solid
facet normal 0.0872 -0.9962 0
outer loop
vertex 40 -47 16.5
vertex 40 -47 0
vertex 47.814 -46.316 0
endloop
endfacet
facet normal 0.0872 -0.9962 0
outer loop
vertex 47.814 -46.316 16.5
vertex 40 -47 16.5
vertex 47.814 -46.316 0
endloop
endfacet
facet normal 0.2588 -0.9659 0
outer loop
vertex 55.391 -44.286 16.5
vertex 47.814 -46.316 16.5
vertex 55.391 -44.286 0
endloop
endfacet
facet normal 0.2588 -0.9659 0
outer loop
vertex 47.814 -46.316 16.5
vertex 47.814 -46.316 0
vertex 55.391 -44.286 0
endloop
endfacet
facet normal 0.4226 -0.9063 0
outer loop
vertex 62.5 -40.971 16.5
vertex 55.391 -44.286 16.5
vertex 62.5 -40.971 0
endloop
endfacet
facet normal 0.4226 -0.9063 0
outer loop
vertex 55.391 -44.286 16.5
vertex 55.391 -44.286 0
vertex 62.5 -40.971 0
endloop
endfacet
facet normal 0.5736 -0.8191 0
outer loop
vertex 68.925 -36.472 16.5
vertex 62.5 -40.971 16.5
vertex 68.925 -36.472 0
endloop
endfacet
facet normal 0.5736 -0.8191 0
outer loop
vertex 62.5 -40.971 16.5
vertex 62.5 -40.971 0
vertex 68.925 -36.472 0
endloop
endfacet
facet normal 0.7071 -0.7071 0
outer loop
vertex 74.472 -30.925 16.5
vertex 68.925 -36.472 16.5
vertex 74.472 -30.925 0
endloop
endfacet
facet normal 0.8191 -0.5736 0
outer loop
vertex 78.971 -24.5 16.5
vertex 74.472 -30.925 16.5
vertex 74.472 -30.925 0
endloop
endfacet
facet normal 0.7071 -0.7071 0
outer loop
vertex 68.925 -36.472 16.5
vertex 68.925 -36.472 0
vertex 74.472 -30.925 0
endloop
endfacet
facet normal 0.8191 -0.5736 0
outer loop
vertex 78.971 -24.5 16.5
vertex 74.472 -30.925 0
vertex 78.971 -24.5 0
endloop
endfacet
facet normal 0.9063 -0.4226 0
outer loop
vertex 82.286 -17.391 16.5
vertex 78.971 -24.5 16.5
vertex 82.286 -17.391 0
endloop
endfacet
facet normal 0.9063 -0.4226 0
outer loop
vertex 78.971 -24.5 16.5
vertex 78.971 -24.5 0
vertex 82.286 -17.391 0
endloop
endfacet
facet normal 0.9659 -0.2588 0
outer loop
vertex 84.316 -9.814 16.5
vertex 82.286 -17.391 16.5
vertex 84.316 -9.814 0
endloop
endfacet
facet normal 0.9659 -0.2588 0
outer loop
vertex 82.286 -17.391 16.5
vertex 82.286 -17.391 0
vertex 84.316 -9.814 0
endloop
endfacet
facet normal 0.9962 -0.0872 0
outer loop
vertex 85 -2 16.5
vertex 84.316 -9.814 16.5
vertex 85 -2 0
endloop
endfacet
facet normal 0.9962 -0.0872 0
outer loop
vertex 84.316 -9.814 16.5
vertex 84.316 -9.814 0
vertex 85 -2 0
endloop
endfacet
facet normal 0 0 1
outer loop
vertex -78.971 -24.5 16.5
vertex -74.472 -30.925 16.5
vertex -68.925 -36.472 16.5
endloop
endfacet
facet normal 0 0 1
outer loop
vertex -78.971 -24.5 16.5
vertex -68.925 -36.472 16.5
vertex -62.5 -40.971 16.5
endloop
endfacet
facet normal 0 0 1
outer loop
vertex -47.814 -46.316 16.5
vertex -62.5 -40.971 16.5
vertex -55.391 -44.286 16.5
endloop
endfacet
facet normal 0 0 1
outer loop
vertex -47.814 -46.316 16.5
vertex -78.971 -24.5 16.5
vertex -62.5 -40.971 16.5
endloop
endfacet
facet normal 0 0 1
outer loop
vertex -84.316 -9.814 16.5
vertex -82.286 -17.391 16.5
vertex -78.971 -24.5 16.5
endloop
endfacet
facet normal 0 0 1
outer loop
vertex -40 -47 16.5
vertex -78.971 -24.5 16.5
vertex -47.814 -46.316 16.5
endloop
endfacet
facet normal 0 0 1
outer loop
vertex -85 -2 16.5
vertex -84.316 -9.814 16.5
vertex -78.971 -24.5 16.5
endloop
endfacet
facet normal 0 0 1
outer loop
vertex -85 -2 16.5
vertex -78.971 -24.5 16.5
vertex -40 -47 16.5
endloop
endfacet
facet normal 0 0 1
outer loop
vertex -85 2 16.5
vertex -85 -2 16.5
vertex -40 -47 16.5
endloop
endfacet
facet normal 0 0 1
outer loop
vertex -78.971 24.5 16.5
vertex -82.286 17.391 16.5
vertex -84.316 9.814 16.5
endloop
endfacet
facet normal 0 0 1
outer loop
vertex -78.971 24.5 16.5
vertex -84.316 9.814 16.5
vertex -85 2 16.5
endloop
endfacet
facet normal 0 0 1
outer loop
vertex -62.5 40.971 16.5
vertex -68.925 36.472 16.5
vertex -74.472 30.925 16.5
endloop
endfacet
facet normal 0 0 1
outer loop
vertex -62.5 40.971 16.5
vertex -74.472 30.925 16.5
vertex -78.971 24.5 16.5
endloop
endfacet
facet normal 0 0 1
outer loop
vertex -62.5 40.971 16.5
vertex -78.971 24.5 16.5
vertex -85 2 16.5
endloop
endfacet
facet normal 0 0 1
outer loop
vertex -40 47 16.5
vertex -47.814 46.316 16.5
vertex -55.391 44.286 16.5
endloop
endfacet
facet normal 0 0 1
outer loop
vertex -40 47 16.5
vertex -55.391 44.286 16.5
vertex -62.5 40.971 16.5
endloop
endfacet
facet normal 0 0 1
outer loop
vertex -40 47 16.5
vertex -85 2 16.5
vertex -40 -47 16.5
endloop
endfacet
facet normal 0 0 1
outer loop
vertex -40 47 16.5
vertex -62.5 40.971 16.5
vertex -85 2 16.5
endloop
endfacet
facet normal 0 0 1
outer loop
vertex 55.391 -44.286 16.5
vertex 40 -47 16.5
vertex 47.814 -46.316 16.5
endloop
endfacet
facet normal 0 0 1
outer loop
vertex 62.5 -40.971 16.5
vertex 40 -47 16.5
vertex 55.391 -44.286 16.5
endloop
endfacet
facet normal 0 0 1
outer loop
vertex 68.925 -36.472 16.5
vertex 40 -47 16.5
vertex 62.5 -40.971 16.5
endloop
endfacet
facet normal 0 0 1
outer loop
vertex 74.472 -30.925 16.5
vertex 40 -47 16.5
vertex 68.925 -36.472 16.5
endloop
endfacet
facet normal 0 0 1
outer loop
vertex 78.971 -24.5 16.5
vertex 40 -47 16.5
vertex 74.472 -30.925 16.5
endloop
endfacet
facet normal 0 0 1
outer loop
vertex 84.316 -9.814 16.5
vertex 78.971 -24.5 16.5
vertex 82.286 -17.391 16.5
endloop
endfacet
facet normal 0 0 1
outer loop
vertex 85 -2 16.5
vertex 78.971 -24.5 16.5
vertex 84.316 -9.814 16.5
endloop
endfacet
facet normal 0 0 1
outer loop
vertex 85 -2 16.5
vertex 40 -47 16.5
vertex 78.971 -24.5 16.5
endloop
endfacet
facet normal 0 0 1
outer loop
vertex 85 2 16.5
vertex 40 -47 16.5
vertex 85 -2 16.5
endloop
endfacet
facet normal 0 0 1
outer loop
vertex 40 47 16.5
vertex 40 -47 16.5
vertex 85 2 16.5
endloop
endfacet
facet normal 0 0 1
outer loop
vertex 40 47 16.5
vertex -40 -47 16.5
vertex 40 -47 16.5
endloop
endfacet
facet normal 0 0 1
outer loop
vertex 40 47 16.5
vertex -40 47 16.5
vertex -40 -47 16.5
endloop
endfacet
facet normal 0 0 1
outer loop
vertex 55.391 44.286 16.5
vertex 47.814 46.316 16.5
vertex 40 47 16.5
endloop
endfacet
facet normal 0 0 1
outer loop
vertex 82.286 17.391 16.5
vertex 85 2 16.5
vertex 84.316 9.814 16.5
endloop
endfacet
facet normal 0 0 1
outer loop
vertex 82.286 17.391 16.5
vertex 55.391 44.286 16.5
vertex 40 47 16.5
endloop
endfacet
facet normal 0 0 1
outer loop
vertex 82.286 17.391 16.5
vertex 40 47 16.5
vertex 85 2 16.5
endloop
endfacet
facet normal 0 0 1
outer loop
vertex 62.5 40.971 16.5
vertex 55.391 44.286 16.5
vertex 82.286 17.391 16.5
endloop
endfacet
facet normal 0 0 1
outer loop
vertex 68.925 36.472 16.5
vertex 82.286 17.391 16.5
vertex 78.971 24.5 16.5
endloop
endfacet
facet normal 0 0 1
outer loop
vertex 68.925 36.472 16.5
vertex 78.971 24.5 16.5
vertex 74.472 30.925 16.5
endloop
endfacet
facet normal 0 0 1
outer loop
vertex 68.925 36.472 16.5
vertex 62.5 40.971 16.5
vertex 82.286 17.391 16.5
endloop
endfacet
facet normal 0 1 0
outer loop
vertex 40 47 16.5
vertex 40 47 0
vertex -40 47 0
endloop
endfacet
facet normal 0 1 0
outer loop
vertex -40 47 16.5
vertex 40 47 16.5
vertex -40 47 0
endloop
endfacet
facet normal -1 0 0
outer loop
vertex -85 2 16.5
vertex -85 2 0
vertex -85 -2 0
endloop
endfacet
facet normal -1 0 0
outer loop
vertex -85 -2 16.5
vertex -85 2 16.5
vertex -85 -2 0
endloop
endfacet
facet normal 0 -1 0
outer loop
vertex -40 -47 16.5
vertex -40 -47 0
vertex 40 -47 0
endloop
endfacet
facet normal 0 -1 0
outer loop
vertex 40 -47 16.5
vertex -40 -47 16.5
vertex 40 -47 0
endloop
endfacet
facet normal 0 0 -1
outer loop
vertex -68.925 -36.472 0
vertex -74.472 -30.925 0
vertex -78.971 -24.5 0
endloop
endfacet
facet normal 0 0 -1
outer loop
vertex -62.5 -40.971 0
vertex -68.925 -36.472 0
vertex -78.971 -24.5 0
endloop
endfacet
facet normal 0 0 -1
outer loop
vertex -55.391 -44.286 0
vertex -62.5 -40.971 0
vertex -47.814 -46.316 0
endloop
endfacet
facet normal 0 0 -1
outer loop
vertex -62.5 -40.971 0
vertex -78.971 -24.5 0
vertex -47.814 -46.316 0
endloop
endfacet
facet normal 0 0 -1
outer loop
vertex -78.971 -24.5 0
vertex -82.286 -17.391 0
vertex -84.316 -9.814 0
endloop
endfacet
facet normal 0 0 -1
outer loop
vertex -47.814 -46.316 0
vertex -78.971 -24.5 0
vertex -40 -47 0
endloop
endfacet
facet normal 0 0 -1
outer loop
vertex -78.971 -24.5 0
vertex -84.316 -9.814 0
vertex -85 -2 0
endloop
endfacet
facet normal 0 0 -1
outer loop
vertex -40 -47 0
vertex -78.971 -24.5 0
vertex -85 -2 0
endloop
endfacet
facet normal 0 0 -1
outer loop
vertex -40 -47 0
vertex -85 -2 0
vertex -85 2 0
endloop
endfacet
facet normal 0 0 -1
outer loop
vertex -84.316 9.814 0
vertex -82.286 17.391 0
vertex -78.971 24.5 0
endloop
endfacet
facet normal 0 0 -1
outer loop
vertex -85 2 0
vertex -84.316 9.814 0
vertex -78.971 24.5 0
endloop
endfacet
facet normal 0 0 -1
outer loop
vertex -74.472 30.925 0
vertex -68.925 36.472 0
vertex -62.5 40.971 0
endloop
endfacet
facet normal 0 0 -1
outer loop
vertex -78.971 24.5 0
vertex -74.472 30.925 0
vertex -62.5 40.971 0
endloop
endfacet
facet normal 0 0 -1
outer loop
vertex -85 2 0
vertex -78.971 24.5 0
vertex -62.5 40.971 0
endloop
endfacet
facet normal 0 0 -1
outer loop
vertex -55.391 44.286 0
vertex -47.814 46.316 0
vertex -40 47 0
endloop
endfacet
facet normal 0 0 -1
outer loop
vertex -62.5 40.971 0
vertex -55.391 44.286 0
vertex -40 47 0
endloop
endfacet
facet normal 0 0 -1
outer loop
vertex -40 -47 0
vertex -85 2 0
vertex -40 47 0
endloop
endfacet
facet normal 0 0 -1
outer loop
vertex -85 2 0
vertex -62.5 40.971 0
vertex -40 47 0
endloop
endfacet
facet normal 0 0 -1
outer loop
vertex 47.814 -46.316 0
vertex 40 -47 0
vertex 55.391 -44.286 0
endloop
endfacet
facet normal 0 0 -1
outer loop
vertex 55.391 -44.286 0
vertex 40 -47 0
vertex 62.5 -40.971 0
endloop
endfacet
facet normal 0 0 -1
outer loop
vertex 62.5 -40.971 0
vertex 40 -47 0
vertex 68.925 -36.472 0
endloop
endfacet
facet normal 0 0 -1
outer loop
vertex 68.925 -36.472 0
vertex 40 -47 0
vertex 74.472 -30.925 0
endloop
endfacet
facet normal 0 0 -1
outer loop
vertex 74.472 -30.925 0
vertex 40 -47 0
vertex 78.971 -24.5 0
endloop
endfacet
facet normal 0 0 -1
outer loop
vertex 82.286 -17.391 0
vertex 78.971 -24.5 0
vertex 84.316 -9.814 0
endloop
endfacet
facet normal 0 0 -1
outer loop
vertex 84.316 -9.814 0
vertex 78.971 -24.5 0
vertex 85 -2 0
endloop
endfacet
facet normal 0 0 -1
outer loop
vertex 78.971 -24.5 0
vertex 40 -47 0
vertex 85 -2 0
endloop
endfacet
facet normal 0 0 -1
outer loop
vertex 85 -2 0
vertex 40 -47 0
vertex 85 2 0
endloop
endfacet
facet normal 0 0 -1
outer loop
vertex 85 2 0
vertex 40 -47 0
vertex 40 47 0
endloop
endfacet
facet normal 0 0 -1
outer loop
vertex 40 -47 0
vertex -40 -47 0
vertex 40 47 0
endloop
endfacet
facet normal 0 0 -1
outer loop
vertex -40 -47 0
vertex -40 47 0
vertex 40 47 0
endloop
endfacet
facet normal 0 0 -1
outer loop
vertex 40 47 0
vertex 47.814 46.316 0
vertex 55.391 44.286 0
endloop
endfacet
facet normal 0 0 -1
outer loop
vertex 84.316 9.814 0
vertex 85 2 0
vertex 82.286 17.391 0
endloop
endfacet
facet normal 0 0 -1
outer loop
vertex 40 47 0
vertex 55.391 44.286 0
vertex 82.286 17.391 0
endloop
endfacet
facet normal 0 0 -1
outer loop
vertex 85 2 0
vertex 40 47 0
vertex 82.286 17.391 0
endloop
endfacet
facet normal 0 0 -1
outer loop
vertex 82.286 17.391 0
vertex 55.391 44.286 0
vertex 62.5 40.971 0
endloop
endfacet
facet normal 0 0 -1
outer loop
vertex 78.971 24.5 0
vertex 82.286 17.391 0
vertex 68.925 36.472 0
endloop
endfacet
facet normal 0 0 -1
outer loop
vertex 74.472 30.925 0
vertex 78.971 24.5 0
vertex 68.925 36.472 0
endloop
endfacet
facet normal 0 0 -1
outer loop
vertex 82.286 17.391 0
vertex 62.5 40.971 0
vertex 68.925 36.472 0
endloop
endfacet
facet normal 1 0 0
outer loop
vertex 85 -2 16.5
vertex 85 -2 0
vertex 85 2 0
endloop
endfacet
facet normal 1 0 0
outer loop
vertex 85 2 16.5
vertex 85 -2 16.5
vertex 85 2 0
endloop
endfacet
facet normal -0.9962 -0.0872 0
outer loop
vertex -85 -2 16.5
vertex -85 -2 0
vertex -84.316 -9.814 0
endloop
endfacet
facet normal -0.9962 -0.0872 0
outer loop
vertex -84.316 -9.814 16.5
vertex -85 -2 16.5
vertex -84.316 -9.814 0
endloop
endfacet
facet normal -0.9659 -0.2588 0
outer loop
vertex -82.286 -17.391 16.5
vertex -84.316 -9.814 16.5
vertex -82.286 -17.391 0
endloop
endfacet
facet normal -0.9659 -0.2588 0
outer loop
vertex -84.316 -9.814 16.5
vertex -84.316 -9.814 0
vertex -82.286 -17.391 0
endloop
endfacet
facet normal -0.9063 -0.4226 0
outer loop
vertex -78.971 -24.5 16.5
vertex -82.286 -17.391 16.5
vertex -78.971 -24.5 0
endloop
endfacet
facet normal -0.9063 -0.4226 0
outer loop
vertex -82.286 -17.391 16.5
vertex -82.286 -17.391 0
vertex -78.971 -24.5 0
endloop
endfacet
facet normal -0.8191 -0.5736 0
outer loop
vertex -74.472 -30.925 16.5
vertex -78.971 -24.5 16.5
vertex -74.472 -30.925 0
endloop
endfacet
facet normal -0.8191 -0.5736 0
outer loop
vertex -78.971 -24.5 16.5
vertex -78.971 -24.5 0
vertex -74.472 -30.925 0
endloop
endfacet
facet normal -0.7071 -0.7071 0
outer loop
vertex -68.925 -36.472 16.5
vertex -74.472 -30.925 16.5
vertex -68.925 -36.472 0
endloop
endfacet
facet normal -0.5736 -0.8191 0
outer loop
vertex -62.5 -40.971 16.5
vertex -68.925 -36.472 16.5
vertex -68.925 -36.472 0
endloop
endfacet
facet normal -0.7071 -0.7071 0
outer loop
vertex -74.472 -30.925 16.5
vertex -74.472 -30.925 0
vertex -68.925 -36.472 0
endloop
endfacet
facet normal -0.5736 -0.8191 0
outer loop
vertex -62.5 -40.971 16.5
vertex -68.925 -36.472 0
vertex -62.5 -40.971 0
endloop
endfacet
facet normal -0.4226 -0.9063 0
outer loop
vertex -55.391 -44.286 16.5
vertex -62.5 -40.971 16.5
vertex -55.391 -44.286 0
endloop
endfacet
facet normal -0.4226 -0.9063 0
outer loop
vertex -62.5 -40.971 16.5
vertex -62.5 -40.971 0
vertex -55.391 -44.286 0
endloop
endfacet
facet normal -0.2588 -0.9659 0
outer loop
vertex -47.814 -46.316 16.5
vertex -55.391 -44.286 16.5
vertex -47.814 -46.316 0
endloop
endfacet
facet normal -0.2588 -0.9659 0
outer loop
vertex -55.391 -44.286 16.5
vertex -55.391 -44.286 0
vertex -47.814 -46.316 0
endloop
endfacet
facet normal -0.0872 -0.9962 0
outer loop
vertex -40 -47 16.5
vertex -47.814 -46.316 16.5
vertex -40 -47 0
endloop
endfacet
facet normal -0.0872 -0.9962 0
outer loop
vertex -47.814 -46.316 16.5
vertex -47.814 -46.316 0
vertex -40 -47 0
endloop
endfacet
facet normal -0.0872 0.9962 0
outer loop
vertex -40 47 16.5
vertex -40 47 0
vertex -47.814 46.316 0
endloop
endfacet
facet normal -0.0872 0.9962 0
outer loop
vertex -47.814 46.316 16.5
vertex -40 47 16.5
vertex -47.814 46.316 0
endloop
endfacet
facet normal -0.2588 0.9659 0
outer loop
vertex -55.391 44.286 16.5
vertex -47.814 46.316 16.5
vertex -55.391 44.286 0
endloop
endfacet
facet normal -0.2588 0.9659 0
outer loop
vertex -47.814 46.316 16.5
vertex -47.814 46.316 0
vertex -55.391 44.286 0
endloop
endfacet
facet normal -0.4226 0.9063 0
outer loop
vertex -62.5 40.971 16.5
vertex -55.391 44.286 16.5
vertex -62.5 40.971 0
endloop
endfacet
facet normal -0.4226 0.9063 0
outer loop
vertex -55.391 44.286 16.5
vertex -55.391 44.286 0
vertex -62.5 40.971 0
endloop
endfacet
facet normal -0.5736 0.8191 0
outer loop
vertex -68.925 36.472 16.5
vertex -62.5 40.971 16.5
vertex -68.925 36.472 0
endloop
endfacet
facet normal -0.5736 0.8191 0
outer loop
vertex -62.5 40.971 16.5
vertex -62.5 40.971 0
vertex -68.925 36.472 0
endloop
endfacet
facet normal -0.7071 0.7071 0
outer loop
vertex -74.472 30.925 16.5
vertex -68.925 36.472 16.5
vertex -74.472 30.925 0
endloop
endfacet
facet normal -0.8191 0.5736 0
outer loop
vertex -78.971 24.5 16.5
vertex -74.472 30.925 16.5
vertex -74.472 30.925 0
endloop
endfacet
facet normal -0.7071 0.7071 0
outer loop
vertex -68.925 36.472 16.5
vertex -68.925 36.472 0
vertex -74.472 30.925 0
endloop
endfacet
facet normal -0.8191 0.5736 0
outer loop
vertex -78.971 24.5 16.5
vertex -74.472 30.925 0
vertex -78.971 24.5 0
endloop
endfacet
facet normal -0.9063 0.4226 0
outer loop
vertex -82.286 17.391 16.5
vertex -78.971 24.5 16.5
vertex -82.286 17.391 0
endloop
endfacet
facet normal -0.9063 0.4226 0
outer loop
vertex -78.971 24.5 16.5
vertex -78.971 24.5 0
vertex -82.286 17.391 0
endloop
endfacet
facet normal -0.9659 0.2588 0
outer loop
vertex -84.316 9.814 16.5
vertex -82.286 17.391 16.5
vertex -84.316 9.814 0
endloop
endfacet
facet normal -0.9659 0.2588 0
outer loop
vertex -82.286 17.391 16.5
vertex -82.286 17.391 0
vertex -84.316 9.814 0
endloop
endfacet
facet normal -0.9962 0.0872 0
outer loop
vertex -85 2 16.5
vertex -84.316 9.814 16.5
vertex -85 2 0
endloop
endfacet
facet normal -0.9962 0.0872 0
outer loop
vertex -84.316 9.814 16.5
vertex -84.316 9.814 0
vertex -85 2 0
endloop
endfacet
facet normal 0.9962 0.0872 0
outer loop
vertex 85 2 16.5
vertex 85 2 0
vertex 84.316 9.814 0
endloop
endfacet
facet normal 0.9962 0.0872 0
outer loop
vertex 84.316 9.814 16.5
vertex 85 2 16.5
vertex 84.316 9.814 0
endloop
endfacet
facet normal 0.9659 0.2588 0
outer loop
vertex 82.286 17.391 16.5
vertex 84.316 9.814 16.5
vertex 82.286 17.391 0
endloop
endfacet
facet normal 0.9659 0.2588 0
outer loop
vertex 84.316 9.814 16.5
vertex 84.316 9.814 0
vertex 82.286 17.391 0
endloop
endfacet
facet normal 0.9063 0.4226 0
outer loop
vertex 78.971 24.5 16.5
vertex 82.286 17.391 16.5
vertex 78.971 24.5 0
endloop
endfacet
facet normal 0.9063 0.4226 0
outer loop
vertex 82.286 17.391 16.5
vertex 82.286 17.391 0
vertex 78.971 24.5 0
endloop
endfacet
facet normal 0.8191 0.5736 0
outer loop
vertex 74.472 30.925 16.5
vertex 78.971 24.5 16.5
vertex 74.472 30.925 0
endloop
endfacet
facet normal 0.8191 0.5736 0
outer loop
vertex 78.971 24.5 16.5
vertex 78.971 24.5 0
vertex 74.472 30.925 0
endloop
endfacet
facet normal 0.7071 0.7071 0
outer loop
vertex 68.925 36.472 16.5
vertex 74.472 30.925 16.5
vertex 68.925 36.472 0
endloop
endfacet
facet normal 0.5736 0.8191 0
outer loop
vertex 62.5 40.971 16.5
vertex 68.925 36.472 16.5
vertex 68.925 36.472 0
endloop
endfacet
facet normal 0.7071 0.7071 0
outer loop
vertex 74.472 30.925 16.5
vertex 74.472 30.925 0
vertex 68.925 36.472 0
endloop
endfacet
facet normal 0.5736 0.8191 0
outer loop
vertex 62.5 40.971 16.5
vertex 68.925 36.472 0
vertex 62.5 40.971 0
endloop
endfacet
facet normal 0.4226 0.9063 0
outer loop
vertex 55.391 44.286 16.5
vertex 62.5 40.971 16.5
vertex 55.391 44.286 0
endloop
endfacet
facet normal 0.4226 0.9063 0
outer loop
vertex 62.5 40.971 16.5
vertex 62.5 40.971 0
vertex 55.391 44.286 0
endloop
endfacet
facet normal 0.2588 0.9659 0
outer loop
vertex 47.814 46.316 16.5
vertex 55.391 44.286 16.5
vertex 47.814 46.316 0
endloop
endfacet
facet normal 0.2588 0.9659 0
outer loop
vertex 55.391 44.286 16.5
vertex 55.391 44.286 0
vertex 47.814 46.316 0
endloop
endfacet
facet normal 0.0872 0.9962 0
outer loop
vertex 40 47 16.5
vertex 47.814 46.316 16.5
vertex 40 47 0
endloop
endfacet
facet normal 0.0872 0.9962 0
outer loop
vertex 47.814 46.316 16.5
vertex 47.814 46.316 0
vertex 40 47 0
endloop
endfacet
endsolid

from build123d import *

# Parameters (mm, degrees)
F2_DEPTH = 16.5
F3_DEPTH = 21


with BuildPart() as f2:
    # F1 (on face) → F2 (new body)
    with BuildSketch(Plane.XY):
        with BuildLine():
            Line((-40, -47), (40, -47))
            ThreePointArc((40, -47), (71.819805, -33.819805), (85, -2))
            Line((85, -2), (85, 2))
            ThreePointArc((85, 2), (71.819805, 33.819805), (40, 47))
            Line((40, 47), (-40, 47))
            ThreePointArc((-40, 47), (-71.819805, 33.819805), (-85, 2))
            Line((-85, 2), (-85, -2))
            ThreePointArc((-85, -2), (-71.819805, -33.819805), (-40, -47))
        make_face()
    extrude(amount=F2_DEPTH)

    # F0 (on Top) → F3 (intersect)
    with BuildSketch(Plane.XY):
        with BuildLine():
            Line((-44.5, -51.5), (44.5, -51.5))
            ThreePointArc((44.5, -51.5), (76.319805, -38.319805), (89.5, -6.5))
            Line((89.5, -6.5), (89.5, 6.5))
            ThreePointArc((89.5, 6.5), (76.319805, 38.319805), (44.5, 51.5))
            Line((44.5, 51.5), (-44.5, 51.5))
            ThreePointArc((-44.5, 51.5), (-76.319805, 38.319805), (-89.5, 6.5))
            Line((-89.5, 6.5), (-89.5, -6.5))
            ThreePointArc((-89.5, -6.5), (-76.319805, -38.319805), (-44.5, -51.5))
        make_face()
    extrude(amount=F3_DEPTH, mode=Mode.INTERSECT)


solid = f2.part
